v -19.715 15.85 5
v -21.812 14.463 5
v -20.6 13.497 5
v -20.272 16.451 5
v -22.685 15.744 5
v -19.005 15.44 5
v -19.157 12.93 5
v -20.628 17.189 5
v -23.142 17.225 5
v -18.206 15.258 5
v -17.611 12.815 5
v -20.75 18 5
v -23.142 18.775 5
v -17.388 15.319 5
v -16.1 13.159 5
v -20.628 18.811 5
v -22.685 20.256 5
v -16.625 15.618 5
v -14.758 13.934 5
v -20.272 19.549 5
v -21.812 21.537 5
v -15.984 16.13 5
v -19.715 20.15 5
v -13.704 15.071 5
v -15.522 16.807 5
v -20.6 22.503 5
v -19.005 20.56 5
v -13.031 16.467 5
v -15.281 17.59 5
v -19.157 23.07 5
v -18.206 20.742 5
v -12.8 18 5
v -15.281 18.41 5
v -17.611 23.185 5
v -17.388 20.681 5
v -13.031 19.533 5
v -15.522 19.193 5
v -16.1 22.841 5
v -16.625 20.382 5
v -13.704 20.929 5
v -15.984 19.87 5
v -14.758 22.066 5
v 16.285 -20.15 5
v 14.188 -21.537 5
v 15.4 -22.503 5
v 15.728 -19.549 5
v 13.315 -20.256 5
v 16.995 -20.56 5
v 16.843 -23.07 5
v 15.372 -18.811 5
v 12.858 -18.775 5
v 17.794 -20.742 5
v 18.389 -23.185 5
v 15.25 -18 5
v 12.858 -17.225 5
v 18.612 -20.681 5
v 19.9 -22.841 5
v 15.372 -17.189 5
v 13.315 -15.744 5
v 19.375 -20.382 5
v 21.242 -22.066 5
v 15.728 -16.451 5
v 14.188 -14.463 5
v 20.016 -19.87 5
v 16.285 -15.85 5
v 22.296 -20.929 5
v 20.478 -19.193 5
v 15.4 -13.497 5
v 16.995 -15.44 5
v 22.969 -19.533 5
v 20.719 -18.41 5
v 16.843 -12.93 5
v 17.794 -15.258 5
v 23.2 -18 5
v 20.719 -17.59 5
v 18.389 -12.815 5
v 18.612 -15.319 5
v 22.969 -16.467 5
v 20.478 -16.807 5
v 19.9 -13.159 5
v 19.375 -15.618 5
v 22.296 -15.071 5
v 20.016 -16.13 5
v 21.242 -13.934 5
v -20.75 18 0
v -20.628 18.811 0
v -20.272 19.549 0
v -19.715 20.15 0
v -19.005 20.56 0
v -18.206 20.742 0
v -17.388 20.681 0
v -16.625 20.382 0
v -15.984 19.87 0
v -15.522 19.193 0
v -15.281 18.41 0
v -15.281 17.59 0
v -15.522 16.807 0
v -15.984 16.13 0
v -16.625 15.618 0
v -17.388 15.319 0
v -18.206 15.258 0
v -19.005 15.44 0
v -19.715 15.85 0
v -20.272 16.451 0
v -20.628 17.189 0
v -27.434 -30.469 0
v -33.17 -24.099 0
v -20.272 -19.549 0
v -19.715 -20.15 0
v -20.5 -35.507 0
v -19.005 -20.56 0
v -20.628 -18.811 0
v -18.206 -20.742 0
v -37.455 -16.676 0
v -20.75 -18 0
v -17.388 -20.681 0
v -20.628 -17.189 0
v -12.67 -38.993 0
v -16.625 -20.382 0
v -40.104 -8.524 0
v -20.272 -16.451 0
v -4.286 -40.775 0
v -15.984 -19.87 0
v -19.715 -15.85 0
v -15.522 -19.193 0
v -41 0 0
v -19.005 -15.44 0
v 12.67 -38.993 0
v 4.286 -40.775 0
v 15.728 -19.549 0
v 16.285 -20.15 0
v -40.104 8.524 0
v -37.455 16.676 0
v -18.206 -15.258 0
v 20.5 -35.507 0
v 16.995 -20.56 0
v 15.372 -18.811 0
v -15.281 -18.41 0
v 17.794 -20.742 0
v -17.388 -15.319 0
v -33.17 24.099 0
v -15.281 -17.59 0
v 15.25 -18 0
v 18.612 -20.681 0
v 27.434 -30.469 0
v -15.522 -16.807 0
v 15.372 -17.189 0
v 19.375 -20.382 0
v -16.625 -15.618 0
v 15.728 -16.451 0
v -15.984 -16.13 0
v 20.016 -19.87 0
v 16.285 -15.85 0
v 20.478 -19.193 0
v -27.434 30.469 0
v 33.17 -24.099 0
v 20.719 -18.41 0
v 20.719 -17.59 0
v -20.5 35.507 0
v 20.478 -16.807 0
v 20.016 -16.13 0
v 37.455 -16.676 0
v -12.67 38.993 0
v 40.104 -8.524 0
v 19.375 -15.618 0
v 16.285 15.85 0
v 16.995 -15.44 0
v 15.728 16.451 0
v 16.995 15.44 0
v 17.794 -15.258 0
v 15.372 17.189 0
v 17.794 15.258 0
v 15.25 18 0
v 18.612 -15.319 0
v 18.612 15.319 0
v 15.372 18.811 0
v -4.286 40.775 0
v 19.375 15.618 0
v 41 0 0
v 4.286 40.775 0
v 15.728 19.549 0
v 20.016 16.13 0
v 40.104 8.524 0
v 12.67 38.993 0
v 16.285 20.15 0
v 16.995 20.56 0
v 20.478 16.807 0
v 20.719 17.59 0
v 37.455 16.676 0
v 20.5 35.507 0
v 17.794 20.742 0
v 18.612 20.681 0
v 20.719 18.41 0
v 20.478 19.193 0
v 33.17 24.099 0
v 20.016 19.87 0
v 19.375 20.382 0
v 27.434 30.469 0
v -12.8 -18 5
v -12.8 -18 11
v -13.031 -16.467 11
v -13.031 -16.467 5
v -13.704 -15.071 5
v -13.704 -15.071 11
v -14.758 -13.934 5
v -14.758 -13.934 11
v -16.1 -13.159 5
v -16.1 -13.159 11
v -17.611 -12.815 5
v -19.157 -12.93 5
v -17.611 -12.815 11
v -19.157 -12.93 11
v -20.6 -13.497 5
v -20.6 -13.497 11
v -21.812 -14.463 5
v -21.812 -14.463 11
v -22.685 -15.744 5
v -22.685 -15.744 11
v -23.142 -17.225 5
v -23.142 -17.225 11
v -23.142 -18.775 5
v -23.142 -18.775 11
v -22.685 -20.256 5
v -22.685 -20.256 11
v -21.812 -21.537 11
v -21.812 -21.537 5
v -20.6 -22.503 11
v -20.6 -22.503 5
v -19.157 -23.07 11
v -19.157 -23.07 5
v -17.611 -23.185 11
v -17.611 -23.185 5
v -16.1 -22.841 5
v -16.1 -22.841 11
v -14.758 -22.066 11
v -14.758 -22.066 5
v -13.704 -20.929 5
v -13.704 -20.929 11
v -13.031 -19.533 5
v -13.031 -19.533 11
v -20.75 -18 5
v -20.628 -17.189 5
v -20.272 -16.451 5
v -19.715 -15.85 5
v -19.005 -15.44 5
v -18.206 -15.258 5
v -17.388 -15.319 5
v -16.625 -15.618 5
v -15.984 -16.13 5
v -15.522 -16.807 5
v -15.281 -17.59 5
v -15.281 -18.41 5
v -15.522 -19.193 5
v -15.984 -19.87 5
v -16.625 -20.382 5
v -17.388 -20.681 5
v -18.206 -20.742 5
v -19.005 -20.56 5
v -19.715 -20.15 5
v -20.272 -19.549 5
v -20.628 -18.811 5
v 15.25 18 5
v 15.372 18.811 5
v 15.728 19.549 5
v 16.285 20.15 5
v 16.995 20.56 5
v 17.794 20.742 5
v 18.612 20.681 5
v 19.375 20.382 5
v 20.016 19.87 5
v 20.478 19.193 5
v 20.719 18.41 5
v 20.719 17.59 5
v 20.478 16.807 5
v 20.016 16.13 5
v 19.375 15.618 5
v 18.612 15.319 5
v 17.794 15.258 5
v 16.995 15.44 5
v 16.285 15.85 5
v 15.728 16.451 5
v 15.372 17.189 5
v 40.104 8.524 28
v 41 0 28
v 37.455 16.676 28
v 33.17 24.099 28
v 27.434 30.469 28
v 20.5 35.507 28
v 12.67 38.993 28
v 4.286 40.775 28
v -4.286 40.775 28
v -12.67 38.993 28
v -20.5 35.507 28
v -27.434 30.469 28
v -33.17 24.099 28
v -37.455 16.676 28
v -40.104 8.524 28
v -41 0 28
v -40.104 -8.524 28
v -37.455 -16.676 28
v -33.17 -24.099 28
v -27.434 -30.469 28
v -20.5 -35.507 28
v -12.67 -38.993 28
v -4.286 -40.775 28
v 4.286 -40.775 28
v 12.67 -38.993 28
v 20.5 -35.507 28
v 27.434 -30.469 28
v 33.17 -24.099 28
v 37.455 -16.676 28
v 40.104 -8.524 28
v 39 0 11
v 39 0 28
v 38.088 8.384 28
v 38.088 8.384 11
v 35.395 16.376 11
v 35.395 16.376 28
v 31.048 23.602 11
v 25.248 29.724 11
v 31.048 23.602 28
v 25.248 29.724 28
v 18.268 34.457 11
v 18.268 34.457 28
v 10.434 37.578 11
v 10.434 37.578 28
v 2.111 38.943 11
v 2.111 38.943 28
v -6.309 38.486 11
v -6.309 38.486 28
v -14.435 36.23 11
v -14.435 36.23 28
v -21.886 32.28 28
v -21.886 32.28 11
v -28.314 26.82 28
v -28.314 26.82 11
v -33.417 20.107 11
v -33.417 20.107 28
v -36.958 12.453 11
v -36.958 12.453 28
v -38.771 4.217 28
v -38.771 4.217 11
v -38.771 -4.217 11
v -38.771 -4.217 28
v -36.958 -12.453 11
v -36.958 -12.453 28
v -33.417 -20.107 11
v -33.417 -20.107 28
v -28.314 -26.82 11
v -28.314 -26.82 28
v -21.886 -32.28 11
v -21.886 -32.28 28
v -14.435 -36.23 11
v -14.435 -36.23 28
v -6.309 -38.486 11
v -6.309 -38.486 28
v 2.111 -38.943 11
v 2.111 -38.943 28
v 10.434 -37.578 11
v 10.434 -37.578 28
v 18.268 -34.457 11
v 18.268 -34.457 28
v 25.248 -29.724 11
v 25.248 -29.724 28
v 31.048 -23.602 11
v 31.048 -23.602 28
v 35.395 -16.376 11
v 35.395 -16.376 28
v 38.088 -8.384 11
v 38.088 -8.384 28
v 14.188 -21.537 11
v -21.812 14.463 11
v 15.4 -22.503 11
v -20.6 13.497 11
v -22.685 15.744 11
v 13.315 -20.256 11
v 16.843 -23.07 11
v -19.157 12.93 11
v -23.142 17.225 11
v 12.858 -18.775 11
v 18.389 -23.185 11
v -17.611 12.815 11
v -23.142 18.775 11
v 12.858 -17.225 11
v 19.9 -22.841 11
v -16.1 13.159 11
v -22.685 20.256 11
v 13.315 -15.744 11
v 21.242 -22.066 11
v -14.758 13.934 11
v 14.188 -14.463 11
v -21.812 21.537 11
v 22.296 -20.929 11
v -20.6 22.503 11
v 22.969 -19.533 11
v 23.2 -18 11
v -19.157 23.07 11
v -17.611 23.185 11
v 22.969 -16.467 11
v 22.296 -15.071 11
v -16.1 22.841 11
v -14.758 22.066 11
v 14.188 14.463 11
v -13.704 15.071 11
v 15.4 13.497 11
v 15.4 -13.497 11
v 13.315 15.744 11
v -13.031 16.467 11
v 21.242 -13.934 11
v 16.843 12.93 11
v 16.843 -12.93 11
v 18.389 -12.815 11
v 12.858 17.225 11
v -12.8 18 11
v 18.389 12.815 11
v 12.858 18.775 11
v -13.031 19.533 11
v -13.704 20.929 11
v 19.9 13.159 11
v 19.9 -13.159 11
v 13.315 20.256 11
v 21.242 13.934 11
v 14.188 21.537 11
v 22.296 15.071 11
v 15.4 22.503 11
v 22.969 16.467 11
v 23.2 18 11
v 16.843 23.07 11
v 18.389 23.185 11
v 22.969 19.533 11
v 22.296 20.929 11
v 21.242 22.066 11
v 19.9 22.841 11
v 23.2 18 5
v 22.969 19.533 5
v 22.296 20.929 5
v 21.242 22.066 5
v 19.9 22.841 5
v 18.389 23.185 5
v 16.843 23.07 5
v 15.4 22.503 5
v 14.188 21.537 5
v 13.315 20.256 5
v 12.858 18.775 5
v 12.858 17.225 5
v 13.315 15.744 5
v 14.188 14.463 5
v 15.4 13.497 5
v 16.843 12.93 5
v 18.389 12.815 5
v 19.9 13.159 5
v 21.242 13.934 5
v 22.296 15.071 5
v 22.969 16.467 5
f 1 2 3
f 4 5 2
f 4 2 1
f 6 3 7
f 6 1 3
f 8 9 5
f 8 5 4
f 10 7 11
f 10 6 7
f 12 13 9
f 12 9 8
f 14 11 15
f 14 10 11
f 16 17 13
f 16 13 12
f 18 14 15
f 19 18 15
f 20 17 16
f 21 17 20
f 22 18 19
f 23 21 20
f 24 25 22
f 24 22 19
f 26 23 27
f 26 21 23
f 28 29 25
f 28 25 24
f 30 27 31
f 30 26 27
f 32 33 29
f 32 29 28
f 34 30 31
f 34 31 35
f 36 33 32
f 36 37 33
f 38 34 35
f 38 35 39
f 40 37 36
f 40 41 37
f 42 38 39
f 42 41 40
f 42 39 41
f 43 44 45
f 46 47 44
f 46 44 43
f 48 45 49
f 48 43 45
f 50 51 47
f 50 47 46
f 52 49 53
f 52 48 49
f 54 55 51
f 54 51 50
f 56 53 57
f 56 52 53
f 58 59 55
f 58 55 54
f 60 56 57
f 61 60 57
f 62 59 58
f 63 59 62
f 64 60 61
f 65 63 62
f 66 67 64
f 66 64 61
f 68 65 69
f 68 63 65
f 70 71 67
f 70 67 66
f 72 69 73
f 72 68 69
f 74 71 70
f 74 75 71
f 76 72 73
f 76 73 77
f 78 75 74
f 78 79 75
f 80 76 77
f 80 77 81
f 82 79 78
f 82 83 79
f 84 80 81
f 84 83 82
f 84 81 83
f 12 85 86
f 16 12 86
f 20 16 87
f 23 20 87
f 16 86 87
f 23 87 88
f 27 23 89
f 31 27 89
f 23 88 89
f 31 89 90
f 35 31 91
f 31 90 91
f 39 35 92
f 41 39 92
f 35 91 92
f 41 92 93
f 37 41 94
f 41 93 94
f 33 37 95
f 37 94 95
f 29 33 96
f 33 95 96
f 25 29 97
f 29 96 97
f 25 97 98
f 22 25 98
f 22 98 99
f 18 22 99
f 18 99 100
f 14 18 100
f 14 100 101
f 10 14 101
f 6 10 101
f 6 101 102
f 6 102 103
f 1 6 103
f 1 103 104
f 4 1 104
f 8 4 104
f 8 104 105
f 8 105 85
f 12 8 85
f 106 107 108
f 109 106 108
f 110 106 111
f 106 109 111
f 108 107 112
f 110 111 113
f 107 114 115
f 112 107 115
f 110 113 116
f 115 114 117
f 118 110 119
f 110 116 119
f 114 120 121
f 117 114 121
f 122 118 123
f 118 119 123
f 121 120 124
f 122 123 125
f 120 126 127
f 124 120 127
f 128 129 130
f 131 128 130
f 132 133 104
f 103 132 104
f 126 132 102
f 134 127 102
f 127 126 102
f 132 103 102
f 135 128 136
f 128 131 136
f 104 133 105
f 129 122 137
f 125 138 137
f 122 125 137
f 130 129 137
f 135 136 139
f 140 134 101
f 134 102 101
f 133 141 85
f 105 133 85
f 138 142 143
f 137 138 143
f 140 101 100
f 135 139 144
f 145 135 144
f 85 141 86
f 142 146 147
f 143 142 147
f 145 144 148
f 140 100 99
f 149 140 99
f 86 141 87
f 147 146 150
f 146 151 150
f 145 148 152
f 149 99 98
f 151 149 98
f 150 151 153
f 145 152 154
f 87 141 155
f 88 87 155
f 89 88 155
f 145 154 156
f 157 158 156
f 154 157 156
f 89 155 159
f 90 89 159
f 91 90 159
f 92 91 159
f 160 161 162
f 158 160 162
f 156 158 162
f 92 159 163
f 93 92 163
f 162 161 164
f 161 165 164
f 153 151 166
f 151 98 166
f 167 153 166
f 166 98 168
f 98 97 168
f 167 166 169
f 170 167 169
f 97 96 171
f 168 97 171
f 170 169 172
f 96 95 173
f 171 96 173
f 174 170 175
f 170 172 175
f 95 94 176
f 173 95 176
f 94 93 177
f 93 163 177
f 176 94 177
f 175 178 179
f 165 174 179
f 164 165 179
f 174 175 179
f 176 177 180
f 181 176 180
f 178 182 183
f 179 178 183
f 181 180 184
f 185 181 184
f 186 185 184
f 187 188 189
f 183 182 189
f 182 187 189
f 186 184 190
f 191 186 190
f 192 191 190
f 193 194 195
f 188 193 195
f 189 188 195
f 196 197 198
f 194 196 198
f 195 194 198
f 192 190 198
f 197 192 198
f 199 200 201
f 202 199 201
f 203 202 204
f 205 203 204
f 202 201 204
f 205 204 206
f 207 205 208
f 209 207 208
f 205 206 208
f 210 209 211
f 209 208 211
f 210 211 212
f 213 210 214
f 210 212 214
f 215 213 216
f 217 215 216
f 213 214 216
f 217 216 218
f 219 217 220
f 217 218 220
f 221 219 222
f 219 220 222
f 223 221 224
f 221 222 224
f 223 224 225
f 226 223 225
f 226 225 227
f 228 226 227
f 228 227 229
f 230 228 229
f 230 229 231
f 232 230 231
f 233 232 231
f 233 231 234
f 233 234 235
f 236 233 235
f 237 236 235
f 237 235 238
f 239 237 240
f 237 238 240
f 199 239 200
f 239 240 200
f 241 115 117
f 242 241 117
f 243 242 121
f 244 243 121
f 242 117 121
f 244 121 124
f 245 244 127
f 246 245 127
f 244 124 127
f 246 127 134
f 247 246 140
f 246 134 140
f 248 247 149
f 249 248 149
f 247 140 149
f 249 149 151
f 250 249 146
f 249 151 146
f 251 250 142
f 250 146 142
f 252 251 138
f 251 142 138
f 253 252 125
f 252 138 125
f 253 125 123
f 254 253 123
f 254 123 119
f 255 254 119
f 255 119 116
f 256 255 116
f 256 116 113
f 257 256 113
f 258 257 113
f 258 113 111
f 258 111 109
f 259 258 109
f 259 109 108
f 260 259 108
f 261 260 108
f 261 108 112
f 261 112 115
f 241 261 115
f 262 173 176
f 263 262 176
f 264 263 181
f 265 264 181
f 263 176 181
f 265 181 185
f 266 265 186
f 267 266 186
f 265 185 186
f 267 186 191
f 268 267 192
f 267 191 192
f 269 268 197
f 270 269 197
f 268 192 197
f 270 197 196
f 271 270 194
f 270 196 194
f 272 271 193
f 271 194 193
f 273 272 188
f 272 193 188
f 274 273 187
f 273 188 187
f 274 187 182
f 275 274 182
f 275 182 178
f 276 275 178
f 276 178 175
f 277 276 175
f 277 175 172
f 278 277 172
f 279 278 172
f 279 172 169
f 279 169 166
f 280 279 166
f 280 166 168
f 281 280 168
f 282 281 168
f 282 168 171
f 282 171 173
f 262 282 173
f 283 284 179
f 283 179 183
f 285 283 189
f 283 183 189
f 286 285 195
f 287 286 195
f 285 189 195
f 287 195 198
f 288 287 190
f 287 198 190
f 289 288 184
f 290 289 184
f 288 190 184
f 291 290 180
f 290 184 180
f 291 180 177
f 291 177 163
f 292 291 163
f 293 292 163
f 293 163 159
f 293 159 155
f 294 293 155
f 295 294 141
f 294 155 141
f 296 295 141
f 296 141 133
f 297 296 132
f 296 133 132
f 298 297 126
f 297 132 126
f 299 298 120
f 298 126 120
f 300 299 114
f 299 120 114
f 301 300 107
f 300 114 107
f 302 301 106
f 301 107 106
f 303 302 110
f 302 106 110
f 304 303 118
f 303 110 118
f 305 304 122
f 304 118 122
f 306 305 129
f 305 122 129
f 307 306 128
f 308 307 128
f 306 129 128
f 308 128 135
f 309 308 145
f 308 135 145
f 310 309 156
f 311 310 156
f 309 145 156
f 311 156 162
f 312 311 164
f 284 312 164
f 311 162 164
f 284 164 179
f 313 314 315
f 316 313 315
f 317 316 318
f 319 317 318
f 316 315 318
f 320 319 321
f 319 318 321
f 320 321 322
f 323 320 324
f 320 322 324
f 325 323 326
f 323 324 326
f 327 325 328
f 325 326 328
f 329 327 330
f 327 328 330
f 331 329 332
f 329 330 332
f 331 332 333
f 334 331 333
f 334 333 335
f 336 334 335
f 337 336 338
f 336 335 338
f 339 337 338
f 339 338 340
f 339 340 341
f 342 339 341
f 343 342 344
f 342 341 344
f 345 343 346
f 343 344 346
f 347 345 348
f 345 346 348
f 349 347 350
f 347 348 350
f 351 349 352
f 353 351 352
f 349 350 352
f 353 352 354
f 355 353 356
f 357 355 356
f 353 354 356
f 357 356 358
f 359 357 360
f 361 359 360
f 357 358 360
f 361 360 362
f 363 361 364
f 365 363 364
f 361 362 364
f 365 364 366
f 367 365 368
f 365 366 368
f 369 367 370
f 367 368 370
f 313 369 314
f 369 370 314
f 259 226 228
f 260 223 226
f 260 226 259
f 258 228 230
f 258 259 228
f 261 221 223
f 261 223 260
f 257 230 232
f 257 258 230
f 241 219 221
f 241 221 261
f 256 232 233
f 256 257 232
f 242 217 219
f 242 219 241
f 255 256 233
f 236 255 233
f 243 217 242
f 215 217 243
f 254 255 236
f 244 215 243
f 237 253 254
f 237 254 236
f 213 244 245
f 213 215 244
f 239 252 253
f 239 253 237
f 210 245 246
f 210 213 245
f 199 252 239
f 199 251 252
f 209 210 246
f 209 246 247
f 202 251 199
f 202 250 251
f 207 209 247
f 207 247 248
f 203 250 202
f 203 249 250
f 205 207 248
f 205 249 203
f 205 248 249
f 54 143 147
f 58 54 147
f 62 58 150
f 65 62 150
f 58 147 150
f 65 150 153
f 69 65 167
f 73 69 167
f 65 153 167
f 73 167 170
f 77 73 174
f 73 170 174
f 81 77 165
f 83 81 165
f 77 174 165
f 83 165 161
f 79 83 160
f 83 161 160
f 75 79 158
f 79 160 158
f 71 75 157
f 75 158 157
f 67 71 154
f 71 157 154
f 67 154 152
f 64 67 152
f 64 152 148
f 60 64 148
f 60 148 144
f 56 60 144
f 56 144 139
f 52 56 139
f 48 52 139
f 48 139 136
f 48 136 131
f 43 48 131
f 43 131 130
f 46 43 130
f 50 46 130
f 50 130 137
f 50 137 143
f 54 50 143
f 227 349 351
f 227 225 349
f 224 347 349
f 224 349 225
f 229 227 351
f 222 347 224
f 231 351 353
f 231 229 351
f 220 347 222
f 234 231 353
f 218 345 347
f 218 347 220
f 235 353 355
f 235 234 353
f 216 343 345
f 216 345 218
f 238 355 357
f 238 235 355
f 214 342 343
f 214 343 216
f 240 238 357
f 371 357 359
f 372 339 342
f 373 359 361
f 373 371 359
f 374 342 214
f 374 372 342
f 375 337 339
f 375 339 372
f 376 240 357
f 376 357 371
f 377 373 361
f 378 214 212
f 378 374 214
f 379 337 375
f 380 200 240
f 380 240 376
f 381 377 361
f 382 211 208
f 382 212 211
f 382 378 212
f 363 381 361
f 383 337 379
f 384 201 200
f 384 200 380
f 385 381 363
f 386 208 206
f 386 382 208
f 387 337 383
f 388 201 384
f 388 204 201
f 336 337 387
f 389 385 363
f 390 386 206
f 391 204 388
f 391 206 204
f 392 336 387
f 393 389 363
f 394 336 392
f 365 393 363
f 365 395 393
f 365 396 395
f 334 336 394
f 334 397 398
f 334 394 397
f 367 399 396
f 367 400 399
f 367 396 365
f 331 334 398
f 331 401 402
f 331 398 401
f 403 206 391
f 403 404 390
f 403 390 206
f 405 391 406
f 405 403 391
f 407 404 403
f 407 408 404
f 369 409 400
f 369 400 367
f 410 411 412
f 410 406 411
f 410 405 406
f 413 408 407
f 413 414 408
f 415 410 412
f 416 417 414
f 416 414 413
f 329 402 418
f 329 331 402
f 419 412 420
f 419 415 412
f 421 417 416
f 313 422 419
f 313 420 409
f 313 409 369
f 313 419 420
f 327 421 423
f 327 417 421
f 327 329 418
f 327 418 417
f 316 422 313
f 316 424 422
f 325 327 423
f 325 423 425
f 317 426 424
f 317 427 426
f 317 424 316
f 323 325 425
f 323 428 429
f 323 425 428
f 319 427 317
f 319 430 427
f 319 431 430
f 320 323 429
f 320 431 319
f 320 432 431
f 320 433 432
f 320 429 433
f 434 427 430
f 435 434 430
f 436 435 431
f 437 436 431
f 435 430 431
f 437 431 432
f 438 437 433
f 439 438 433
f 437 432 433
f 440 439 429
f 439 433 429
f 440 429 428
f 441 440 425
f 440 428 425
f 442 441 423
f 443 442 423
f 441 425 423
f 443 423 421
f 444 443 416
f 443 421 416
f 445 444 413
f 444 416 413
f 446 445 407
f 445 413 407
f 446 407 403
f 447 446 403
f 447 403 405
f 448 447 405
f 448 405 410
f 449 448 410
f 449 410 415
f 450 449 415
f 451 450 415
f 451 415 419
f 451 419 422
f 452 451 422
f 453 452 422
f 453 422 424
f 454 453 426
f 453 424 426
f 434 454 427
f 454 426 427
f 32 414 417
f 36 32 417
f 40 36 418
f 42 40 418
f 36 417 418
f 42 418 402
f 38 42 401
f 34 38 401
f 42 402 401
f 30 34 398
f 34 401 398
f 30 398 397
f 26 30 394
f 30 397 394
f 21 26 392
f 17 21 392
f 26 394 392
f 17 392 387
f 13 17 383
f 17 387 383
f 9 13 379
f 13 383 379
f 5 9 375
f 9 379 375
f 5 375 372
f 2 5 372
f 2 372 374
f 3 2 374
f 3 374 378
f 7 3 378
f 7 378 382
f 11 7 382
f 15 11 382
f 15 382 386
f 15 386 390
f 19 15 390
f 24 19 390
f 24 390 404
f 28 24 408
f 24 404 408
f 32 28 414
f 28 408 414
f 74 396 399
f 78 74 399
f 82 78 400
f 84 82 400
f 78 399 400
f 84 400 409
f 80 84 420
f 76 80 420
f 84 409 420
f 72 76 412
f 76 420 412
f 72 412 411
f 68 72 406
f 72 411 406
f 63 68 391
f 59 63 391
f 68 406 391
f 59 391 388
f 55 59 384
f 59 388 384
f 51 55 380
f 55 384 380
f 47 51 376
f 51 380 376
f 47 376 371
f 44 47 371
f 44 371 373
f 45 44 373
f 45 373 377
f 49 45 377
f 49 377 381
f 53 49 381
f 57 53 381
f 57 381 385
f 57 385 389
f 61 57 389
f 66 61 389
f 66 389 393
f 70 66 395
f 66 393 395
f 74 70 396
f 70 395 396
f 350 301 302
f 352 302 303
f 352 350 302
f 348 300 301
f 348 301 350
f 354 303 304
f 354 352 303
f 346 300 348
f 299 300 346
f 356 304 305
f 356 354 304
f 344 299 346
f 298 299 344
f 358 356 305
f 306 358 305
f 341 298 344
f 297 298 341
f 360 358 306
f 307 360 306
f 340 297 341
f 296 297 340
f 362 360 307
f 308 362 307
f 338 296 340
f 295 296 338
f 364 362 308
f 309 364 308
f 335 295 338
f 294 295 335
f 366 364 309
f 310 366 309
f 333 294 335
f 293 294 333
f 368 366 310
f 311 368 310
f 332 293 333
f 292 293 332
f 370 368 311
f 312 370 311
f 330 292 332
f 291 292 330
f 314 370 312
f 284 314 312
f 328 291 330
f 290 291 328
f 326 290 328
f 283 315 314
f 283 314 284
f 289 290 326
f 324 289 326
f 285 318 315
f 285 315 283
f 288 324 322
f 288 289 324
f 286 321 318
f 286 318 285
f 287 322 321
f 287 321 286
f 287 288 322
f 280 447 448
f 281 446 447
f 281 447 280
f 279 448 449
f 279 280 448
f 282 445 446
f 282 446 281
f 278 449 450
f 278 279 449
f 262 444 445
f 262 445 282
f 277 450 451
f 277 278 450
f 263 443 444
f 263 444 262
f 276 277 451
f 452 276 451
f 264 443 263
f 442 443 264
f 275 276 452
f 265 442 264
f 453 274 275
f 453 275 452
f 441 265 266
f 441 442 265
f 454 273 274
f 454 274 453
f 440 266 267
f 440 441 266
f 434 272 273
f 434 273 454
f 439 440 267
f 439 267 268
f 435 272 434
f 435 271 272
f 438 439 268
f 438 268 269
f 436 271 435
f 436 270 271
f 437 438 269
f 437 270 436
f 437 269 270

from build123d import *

# Parameters (mm, degrees)
SCHIZZO2_R                   = 41
ESTRUSIONE_ESTRUSIONE1_DEPTH = 28
SCHIZZO3_R                   = 39
TAGLIO_ESTRUSIONE1_DEPTH     = 17
SCHIZZO4_R                   = 2.75
TAGLIO_ESTRUSIONE3_DEPTH     = 29
SCHIZZO5_R                   = 5.2
TAGLIO_ESTRUSIONE4_DEPTH     = 6


with BuildPart() as part:
    # Schizzo2 → Estrusione-Estrusione1 (new body)
    with BuildSketch(Plane.XY):
        Circle(SCHIZZO2_R)
    extrude(amount=ESTRUSIONE_ESTRUSIONE1_DEPTH)

    # Schizzo3 → Taglio-Estrusione1 (cut)
    with BuildSketch(Plane.XY.offset(28)):
        Circle(SCHIZZO3_R)
    extrude(amount=-TAGLIO_ESTRUSIONE1_DEPTH, mode=Mode.SUBTRACT)

    # Schizzo4 → Taglio-Estrusione3 (cut, through all)
    with BuildSketch(Plane(origin=(0, 0, 0), x_dir=(-1, 0, 0), z_dir=(0, 0, -1))):
        with Locations((-18, 18)):
            Circle(SCHIZZO4_R)
        with Locations((18, 18)):
            Circle(SCHIZZO4_R)
        with Locations((18, -18)):
            Circle(SCHIZZO4_R)
        with Locations((-18, -18)):
            Circle(SCHIZZO4_R)
    extrude(amount=-TAGLIO_ESTRUSIONE3_DEPTH, mode=Mode.SUBTRACT)

    # Schizzo5 → Taglio-Estrusione4 (cut)
    with BuildSketch(Plane.XY.offset(11)):
        with Locations((-18, 18)):
            Circle(SCHIZZO5_R)
        with Locations((18, 18)):
            Circle(SCHIZZO5_R)
        with Locations((18, -18)):
            Circle(SCHIZZO5_R)
        with Locations((-18, -18)):
            Circle(SCHIZZO5_R)
    extrude(amount=-TAGLIO_ESTRUSIONE4_DEPTH, mode=Mode.SUBTRACT)


solid = part.part
